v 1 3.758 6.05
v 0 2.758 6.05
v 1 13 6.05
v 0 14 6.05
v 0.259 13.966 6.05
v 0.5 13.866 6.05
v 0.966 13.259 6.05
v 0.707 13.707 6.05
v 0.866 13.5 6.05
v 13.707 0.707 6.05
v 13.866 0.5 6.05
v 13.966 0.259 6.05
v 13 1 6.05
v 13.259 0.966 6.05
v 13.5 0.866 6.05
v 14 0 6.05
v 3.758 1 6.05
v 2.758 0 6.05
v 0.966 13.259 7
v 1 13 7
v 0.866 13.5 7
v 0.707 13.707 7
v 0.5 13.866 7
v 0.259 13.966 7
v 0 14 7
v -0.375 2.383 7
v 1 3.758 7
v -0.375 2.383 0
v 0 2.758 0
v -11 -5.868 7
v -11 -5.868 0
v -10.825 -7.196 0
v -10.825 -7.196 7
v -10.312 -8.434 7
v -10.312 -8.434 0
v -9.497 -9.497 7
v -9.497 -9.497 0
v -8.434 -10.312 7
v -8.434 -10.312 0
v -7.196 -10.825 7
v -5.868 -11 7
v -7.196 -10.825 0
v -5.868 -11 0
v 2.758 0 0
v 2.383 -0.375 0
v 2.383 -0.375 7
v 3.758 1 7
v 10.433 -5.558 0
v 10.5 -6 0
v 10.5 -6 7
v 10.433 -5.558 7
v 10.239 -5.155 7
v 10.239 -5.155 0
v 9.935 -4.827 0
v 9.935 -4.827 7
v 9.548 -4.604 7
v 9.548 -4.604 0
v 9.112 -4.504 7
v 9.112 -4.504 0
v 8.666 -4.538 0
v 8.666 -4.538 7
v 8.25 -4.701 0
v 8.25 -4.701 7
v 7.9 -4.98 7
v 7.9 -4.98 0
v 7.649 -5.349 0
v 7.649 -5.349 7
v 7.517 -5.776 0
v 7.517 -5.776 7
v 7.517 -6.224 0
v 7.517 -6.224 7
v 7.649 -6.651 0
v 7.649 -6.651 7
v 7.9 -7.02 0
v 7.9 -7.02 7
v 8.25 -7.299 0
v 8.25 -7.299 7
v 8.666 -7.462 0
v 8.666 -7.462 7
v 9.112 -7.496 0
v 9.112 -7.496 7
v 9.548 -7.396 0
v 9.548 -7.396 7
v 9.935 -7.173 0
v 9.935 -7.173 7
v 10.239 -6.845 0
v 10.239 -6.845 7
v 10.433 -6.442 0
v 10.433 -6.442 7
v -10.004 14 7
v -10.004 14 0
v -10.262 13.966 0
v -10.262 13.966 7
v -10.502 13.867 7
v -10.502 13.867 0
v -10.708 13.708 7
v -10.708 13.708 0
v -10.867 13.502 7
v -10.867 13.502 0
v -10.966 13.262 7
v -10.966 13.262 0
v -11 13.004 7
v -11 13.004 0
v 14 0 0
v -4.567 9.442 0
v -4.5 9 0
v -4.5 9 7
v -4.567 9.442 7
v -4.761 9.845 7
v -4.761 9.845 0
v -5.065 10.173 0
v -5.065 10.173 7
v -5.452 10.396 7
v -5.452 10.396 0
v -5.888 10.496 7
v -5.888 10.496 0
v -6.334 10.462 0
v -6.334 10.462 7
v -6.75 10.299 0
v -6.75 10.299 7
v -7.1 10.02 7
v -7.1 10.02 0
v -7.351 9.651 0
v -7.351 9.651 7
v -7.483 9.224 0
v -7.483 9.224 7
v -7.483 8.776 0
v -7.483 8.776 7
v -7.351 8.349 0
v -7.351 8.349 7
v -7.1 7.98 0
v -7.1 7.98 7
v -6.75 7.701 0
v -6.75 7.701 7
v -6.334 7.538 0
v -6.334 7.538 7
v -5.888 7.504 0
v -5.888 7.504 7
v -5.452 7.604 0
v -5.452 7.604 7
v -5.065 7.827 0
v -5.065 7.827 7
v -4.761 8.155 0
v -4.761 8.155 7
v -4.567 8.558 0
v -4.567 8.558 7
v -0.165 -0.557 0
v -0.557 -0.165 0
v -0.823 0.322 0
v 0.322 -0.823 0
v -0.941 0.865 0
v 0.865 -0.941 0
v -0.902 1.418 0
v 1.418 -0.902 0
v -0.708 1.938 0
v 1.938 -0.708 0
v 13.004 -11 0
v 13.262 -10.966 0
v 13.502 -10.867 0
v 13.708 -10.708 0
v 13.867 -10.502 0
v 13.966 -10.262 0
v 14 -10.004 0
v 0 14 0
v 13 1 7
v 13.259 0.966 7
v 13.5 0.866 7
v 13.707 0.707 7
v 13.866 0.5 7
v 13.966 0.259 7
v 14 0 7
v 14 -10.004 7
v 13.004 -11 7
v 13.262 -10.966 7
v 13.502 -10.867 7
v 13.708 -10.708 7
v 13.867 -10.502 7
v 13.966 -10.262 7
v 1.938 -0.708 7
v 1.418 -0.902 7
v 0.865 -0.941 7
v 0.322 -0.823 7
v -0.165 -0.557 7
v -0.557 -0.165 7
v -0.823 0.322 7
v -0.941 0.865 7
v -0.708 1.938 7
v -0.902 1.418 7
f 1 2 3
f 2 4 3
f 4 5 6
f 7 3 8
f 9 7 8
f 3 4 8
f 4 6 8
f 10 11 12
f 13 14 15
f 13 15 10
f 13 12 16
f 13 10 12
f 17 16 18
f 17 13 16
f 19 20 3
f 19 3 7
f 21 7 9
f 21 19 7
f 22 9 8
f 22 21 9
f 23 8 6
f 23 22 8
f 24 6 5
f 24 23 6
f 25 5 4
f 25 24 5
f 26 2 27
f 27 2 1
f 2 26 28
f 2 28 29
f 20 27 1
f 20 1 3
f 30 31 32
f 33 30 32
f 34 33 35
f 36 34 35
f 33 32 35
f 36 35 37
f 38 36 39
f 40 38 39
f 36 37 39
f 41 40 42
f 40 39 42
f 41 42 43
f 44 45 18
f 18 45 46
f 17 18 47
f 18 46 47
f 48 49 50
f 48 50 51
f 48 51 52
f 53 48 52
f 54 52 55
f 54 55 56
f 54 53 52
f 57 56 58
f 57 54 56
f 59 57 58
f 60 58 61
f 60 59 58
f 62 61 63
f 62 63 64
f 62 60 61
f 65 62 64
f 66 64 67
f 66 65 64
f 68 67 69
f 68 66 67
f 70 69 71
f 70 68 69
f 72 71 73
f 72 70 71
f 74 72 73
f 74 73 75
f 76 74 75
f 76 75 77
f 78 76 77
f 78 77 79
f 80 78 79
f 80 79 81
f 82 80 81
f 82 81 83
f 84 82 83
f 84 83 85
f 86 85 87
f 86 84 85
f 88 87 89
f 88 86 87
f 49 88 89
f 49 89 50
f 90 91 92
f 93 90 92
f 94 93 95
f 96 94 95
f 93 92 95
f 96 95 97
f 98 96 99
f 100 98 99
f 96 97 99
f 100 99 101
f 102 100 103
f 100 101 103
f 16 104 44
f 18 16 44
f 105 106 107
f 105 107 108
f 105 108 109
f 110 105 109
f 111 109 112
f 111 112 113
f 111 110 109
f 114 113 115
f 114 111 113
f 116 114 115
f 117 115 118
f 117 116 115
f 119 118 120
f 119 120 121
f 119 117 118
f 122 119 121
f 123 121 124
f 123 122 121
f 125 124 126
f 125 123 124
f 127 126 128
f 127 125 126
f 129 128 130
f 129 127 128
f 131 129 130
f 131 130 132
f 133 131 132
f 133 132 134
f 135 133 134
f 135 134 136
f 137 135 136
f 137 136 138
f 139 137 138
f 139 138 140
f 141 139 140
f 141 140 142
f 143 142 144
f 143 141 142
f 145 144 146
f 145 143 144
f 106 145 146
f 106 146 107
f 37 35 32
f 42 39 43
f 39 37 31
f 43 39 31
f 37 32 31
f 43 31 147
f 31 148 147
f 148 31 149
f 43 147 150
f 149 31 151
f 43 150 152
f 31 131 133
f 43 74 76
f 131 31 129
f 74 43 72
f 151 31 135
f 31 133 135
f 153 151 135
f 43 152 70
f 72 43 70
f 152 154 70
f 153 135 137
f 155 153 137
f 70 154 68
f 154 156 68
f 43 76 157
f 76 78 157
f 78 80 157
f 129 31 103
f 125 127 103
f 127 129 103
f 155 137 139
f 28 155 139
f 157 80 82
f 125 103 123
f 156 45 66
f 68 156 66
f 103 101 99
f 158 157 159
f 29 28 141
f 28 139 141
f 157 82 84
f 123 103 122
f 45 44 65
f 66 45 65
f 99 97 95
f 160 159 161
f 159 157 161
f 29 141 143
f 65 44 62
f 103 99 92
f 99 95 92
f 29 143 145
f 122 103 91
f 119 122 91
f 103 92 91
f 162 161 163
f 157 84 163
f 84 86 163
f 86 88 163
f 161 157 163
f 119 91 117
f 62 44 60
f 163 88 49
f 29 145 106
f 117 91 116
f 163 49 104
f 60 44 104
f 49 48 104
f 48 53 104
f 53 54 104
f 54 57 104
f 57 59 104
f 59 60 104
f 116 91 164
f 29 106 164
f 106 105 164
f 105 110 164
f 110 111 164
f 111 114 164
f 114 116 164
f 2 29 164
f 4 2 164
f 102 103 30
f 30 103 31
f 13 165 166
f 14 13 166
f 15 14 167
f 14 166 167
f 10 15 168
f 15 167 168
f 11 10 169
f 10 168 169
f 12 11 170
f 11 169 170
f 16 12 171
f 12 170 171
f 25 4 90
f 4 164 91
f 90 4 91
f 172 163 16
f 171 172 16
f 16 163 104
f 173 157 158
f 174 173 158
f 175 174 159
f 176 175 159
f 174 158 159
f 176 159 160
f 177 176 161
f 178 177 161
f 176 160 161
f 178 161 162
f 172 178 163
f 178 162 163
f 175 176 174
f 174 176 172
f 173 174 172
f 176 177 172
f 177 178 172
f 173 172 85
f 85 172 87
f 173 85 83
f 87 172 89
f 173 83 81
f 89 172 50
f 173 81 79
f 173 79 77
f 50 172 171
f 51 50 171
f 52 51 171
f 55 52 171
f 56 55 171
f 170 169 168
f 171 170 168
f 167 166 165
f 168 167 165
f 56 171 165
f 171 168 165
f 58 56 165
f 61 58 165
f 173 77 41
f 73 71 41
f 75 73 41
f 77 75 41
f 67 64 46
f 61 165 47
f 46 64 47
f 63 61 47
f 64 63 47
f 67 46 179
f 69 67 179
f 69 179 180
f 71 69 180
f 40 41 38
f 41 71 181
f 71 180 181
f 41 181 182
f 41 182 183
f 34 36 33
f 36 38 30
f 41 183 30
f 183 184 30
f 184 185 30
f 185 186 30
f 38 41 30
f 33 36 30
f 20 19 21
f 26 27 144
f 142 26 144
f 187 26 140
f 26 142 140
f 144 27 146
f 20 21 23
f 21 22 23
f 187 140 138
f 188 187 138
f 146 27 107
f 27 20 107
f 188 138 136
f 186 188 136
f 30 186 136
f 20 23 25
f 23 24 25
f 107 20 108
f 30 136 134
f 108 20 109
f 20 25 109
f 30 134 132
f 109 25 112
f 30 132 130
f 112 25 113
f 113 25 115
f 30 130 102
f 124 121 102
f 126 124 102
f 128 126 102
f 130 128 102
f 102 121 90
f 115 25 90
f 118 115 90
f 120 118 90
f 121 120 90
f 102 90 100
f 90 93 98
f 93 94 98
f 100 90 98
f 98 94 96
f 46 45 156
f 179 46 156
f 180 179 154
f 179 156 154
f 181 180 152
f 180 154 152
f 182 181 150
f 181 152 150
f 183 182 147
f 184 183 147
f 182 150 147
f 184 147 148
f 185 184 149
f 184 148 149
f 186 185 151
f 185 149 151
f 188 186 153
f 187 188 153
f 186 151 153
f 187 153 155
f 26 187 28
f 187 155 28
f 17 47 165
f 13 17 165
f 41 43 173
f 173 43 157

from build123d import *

# Parameters (mm, degrees)
SKETCH1_R           = 1.5
BOSS_EXTRUDE1_DEPTH = 7
BOSS_EXTRUDE2_DEPTH = 0.95


with BuildPart() as part:
    # Sketch1 → Boss-Extrude1 (new body)
    with BuildSketch(Plane.XY):
        with BuildLine():
            Line((-11, 13.003727625), (-11, -5.867758287))
            ThreePointArc((-11, -5.867758287), (-9.496801205, -9.496801205), (-5.867758287, -11))
            Line((-5.867758287, -11), (13.003727625, -11))
            ThreePointArc((13.003727625, -11), (13.708198577, -10.708198577), (14, -10.003727625))
            Line((14, -10.003727625), (14, 0))
            Line((14, 0), (2.757716447, 0))
            Line((2.757716447, 0), (2.382592719, -0.375123728))
            ThreePointArc((2.382592719, -0.375123728), (-0.375123728, -0.375123728), (-0.375123728, 2.382592719))
            Line((-0.375123728, 2.382592719), (0, 2.757716447))
            Line((0, 2.757716447), (0, 14))
            Line((0, 14), (-10.003727625, 14))
            ThreePointArc((-10.003727625, 14), (-10.708198577, 13.708198577), (-11, 13.003727625))
        make_face()
        with Locations((9, -6)):
            Circle(SKETCH1_R, mode=Mode.SUBTRACT)
        with Locations((-6, 9)):
            Circle(SKETCH1_R, mode=Mode.SUBTRACT)
    extrude(amount=BOSS_EXTRUDE1_DEPTH)

    # Sketch2 → Boss-Extrude2 (add)
    with BuildSketch(Plane.XY.offset(7)):
        with BuildLine():
            Line((2.757716447, 0), (3.757716447, 1))
            Line((3.757716447, 1), (13, 1))
            ThreePointArc((13, 1), (13.707106781, 0.707106781), (14, 0))
            Line((14, 0), (2.757716447, 0))
        make_face()
        with BuildLine():
            Line((0, 2.757716447), (1, 3.757716447))
            Line((1, 3.757716447), (1, 13))
            ThreePointArc((1, 13), (0.707106781, 13.707106781), (0, 14))
            Line((0, 14), (0, 2.757716447))
        make_face()
    extrude(amount=-BOSS_EXTRUDE2_DEPTH)


solid = part.part
